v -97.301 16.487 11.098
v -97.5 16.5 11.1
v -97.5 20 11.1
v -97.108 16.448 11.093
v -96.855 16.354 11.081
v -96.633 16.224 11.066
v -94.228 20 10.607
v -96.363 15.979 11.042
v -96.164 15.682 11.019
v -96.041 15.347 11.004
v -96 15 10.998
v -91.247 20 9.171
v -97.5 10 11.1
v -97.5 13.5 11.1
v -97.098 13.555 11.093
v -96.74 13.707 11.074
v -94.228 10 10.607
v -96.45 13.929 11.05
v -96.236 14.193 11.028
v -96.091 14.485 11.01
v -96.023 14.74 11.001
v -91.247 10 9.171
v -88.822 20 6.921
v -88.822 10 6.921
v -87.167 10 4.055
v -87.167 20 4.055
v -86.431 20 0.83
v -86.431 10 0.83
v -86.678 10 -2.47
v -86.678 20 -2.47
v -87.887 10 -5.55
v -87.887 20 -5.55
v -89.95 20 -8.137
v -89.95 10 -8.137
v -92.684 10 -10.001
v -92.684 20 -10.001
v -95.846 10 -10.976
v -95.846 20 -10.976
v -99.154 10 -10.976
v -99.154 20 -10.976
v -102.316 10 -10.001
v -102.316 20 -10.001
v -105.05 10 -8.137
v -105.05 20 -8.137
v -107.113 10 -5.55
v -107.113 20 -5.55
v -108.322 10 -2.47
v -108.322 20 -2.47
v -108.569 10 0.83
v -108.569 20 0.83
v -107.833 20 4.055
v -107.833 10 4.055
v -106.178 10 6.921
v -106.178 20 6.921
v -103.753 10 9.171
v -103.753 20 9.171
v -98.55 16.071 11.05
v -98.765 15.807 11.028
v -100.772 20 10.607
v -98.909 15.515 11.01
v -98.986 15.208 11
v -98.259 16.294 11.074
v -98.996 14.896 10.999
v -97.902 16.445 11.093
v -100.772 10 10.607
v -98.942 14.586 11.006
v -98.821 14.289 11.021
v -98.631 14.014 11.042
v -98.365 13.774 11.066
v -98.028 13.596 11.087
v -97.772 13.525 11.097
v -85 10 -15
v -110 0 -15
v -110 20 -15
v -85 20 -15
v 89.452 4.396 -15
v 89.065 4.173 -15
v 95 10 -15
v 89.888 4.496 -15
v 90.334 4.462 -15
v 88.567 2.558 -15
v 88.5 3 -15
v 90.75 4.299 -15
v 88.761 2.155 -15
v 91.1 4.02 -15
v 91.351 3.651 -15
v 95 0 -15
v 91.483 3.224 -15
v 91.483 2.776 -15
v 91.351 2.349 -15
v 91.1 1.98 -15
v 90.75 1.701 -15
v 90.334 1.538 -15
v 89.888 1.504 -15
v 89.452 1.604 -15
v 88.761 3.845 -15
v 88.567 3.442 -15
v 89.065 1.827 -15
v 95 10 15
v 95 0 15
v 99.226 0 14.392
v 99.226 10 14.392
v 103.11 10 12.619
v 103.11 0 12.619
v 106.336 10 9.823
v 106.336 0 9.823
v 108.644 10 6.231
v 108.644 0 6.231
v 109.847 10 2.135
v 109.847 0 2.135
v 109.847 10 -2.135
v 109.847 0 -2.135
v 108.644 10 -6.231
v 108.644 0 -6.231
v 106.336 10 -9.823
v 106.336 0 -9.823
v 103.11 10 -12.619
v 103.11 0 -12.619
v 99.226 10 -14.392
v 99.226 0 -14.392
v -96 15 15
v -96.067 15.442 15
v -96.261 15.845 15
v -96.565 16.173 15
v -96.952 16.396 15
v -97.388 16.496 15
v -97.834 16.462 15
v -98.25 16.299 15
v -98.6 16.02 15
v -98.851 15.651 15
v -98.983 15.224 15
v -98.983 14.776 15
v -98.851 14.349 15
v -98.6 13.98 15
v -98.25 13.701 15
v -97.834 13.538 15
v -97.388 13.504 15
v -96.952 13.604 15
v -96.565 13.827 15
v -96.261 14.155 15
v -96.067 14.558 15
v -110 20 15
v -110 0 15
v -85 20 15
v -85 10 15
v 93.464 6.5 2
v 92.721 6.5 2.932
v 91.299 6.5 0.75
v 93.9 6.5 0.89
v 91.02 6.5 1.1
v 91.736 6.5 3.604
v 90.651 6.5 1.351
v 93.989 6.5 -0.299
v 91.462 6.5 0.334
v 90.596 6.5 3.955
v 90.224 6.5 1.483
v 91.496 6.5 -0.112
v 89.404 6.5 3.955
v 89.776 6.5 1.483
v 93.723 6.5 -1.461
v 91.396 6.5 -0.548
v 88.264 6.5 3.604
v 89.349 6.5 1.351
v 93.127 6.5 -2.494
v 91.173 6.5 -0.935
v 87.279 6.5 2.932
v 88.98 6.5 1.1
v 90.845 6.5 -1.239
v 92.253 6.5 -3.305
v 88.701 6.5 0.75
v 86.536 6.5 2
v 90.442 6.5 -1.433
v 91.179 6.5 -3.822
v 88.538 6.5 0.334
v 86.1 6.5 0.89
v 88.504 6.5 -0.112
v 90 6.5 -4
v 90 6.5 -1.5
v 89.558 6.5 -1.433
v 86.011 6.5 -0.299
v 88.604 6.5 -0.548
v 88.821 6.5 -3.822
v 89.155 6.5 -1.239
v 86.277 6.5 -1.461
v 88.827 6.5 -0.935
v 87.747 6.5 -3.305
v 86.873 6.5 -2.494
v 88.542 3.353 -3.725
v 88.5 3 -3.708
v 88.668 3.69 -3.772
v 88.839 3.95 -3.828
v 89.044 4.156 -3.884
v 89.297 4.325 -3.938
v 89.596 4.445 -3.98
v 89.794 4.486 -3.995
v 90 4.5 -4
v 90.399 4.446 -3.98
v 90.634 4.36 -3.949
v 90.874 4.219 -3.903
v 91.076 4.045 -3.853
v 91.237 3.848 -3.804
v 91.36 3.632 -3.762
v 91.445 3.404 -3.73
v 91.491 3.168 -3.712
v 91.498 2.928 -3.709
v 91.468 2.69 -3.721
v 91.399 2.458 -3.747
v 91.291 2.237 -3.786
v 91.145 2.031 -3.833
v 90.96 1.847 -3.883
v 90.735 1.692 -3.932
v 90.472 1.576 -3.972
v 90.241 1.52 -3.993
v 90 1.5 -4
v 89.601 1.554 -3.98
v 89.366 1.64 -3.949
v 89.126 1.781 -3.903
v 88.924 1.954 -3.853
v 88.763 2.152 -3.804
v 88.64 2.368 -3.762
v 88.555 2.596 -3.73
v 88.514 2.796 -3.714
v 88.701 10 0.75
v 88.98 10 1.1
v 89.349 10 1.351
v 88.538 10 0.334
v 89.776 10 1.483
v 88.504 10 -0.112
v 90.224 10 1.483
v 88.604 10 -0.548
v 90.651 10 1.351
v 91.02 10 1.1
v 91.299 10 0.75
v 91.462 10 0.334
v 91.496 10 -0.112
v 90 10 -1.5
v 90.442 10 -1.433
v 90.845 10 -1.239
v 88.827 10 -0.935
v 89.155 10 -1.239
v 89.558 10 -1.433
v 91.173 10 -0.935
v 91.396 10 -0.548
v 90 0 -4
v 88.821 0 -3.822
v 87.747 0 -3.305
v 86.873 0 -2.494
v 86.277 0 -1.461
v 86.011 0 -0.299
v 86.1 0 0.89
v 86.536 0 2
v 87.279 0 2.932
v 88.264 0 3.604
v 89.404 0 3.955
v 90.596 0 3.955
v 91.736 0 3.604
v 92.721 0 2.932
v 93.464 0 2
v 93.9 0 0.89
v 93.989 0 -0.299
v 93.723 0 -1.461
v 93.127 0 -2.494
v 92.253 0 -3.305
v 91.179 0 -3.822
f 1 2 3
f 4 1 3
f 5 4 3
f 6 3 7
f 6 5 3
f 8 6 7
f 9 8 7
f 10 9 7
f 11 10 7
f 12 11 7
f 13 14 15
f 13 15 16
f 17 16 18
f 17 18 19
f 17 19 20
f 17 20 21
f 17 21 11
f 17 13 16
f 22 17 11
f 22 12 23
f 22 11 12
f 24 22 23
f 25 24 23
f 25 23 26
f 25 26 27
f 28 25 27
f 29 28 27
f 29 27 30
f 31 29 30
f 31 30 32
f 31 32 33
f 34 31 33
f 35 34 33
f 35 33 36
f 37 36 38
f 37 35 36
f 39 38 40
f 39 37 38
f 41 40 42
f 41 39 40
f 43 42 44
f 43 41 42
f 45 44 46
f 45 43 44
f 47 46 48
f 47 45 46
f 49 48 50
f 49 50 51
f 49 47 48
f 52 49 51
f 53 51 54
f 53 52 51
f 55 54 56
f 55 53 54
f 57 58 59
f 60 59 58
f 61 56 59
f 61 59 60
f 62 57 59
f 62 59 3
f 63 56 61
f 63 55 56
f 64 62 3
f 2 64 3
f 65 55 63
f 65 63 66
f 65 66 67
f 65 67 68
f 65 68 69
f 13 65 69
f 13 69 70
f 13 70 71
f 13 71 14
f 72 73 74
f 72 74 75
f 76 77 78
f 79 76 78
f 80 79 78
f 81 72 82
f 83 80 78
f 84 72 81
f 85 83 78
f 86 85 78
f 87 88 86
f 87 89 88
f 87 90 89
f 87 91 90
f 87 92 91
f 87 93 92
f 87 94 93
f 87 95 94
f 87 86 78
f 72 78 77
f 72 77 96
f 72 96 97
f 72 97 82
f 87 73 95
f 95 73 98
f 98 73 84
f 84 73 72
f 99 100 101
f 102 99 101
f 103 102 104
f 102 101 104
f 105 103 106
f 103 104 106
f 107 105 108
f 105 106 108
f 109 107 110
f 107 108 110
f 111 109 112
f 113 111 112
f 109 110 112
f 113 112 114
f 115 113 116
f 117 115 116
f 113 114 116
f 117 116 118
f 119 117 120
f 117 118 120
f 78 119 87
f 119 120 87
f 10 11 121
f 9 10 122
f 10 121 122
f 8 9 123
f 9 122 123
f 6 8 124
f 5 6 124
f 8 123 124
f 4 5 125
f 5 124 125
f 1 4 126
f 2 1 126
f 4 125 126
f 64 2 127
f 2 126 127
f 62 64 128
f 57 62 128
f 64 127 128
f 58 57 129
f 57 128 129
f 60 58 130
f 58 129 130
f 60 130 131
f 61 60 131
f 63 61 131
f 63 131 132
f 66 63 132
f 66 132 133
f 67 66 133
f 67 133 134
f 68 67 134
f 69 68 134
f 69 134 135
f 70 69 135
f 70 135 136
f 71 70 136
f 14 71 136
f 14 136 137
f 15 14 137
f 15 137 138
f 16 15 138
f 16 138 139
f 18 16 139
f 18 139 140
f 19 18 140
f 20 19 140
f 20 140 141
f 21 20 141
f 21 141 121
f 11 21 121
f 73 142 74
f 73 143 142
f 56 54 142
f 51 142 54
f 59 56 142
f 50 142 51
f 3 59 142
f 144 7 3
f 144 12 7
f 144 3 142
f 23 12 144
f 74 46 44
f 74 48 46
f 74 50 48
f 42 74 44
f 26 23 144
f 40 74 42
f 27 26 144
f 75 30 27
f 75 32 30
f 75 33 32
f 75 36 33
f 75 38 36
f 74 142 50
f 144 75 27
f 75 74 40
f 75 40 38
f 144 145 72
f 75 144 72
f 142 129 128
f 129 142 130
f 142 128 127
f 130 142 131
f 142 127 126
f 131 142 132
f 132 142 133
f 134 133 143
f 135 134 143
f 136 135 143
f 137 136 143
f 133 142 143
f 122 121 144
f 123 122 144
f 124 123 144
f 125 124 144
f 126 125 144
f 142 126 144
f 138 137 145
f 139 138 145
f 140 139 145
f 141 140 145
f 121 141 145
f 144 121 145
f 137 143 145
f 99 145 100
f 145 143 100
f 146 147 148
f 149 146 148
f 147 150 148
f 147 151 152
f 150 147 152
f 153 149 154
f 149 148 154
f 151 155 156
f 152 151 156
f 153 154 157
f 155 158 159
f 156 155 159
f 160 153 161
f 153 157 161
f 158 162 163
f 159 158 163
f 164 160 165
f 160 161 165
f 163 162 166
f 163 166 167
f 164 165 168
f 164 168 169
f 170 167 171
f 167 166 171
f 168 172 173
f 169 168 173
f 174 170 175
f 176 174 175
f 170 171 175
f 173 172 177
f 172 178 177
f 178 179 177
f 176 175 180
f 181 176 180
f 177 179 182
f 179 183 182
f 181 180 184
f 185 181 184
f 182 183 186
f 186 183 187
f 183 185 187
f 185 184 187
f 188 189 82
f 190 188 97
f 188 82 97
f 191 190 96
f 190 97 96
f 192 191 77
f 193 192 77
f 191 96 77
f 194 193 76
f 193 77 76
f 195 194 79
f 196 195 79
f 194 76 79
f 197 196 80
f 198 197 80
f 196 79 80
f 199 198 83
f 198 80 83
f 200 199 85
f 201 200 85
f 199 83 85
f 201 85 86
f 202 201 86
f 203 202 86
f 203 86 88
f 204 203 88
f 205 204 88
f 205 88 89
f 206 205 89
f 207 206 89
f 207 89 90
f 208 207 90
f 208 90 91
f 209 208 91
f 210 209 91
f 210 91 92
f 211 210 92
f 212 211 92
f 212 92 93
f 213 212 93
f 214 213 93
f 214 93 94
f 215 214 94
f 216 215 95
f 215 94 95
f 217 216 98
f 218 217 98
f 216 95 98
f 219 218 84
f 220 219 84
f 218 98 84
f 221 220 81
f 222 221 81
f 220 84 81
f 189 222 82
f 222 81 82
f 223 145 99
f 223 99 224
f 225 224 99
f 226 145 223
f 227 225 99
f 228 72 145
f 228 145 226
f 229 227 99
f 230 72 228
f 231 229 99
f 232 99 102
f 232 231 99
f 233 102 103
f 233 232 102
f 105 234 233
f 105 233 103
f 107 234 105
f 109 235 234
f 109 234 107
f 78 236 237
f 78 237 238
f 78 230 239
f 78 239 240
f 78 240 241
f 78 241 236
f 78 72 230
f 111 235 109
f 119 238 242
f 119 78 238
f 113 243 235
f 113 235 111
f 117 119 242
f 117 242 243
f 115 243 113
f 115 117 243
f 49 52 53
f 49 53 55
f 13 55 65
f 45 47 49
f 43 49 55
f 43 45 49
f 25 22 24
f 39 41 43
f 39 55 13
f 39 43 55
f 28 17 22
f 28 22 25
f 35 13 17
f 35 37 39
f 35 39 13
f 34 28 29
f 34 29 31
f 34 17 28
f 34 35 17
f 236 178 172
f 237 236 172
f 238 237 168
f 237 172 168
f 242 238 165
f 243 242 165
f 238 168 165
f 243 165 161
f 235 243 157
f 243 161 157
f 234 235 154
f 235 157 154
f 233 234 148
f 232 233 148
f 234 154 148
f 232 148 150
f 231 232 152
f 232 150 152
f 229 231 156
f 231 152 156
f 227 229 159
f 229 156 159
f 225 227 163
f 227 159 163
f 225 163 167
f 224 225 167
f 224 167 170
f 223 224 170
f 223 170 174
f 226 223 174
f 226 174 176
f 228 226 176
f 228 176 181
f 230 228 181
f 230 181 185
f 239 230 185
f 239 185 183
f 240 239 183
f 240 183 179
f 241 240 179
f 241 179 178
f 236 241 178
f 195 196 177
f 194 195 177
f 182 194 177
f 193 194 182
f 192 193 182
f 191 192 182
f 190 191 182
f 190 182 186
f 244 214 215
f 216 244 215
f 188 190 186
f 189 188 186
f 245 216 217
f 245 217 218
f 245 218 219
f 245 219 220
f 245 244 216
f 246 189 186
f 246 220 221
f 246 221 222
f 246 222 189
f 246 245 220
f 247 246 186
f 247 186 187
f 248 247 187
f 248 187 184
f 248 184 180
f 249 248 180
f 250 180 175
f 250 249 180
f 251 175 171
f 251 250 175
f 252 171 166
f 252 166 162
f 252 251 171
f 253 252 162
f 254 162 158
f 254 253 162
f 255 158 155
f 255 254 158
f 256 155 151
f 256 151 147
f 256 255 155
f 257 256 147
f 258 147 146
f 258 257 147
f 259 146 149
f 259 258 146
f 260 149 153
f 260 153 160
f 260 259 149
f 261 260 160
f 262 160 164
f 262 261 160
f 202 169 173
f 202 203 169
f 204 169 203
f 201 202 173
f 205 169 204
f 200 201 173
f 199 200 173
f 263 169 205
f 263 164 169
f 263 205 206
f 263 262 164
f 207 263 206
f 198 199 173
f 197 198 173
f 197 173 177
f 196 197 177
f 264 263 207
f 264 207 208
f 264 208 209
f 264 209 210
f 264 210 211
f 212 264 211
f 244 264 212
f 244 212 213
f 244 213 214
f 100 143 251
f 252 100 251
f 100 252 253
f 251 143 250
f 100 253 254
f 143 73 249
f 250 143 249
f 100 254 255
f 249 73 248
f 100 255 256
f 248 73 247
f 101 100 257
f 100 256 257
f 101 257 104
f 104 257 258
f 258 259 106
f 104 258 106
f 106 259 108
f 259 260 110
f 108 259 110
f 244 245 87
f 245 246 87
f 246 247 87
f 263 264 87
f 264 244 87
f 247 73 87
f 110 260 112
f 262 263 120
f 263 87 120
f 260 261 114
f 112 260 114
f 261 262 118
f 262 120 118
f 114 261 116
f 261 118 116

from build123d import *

# Parameters (mm, degrees)
SKETCH1_R               = 15
BOSS_EXTRUDE1_DEPTH     = 10
SKETCH2_W               = 25
SKETCH2_H               = 30
SKETCH2_R               = 11.1
BOSS_EXTRUDE3_DEPTH     = 10
SKETCH6_R               = 1.5
CUT_EXTRUDE2_DEPTH      = 10
CUT_EXTRUDE3_START      = -10
SKETCH4_R               = 4
CUT_EXTRUDE3_DEPTH      = 6.5
SKETCH7_R               = 1.5
CUT_EXTRUDE4_DEPTH      = 14
CUT_EXTRUDE5_REACH      = 117.758
CUT_EXTRUDE5_END_RADIUS = 4
SKETCH8_R               = 1.5


with BuildPart() as part:
    # Sketch1 → Boss-Extrude1 (new body)
    with BuildSketch(Plane(origin=(0, 0, 0), x_dir=(1, 0, 0), z_dir=(0, 1, 0))):
        with BuildLine():
            Line((-110, 15), (-110, -15))
            Line((-110, -15), (95, -15))
            ThreePointArc((95, -15), (80, 0), (95, 15))
            Line((95, 15), (-110, 15))
        make_face()
        with Locations((95, 0)):
            Circle(SKETCH1_R)
    extrude(amount=BOSS_EXTRUDE1_DEPTH)

    # Sketch2 → Boss-Extrude3 (add)
    with BuildSketch(Plane(origin=(0, 10, 0), x_dir=(1, 0, 0), z_dir=(0, 1, 0))):
        with Locations((-97.5, 0)):
            Rectangle(SKETCH2_W, SKETCH2_H)
        with Locations(Location((-97.5, 0, 0), (0, 0, 270))):
            Circle(SKETCH2_R, mode=Mode.SUBTRACT)
    extrude(amount=BOSS_EXTRUDE3_DEPTH)

    # Sketch6 → Cut-Extrude2 (cut)
    with BuildSketch(Plane.XY.offset(15)):
        with Locations((-97.5, 15)):
            Circle(SKETCH6_R)
    extrude(amount=-CUT_EXTRUDE2_DEPTH, mode=Mode.SUBTRACT)

    # Sketch4 → Cut-Extrude3 (cut)
    with BuildSketch(Plane(origin=(0, 10, 0), x_dir=(1, 0, 0), z_dir=(0, 1, 0)).offset(CUT_EXTRUDE3_START)):
        with Locations(Location((90, 0, 0), (0, 0, 90))):
            Circle(SKETCH4_R)
    extrude(amount=CUT_EXTRUDE3_DEPTH, mode=Mode.SUBTRACT)

    # Sketch7 → Cut-Extrude4 (cut)
    with BuildSketch(Plane(origin=(0, 6.5, 0), x_dir=(-1, 0, 0), z_dir=(0, -1, 0))):
        with Locations(Location((-90, 0, 0), (0, 0, 90))):
            Circle(SKETCH7_R)
    extrude(amount=-CUT_EXTRUDE4_DEPTH, mode=Mode.SUBTRACT)

    # Cut-Extrude5: up to this cylinder (the profile starts outside it)
    cut_extrude5_end = Plane(origin=(90, 3, 0), z_dir=(0, -1, 0)) * Cylinder(CUT_EXTRUDE5_END_RADIUS, 244.516, mode=Mode.PRIVATE)
    # Sketch8 → Cut-Extrude5 (cut, up to the surface)
    with BuildSketch(Plane(origin=(0, 0, -15), x_dir=(-1, 0, 0), z_dir=(0, 0, -1)), mode=Mode.PRIVATE) as cut_extrude5_sk1:
        with Locations((-90, 3)):
            Circle(SKETCH8_R)
    cut_extrude5_tool1 = extrude(cut_extrude5_sk1.sketch, amount=-CUT_EXTRUDE5_REACH, mode=Mode.PRIVATE) - cut_extrude5_end
    add(cut_extrude5_tool1.solids().sort_by_distance((90, 3, -15))[0], mode=Mode.SUBTRACT)


solid = part.part
